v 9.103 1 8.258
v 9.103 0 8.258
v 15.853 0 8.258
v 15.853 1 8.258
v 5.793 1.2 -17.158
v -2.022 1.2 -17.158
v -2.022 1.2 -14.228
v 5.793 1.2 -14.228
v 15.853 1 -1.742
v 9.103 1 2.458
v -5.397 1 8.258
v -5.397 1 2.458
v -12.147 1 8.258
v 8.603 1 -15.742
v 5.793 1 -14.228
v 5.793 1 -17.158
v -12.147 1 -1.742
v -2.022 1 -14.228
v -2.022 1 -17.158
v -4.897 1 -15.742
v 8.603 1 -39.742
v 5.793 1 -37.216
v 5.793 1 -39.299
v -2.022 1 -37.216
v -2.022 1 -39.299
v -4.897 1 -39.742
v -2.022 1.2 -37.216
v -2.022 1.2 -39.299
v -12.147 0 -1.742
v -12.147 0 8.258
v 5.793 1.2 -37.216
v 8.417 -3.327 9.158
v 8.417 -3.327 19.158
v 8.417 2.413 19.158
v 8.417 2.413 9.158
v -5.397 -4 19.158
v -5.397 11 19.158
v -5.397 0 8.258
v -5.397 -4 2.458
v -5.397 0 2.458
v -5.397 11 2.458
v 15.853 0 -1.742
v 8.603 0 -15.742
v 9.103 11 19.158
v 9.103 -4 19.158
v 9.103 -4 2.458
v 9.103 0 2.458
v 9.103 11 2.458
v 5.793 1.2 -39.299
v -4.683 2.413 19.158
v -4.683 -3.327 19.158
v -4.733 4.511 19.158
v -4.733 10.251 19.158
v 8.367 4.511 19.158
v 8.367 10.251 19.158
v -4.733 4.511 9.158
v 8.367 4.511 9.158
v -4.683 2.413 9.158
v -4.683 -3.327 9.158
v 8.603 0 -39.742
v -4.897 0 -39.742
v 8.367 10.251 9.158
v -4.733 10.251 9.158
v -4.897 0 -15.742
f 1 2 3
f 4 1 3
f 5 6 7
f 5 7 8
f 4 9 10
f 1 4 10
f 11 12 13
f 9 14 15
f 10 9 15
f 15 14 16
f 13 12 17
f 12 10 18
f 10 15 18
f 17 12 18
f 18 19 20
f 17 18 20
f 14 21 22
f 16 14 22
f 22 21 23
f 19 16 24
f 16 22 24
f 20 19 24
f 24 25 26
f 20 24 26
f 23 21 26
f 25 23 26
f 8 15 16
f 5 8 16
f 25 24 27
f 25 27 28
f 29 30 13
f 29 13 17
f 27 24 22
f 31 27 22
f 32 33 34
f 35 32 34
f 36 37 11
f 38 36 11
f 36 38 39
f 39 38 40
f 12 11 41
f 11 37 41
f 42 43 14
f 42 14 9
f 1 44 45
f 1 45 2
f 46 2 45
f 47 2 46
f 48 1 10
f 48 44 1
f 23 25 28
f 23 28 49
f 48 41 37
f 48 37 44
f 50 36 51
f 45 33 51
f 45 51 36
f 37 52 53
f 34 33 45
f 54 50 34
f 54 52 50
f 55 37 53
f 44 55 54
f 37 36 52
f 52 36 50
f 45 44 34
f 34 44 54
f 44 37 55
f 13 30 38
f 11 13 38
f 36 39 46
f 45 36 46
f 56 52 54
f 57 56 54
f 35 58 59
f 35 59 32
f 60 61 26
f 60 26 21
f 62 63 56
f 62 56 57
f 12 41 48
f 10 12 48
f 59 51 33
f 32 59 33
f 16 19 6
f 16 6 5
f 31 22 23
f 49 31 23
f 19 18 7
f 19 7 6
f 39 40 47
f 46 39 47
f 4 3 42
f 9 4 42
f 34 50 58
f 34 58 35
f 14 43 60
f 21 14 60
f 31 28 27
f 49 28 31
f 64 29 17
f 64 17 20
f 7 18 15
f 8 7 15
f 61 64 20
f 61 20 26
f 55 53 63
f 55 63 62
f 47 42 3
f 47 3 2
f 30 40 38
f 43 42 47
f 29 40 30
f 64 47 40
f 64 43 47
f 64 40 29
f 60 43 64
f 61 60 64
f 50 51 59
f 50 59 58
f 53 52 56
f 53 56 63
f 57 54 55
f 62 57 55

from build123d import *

# Parameters (mm, degrees)
SKETCH1_W           = 28
SKETCH1_H           = 10
SKETCH1_W_2         = 13.5
SKETCH1_H_2         = 24
BOSS_EXTRUDE1_DEPTH = 1
SKETCH2_W           = 14.5
SKETCH2_H           = 16.7
BOSS_EXTRUDE2_DEPTH = 15
SKETCH3_W           = 13.1
SKETCH3_H           = 5.74
CUT_EXTRUDE1_DEPTH  = 10
SKETCH4_W           = 7.814614209
SKETCH4_H           = 2.930480328
SKETCH4_H_2         = 2.083897123
BOSS_EXTRUDE3_DEPTH = 0.2


with BuildPart() as part:
    # Sketch1 → Boss-Extrude1 (new body)
    with BuildSketch(Plane(origin=(0, 0, 0), x_dir=(1, 0, 0), z_dir=(0, 1, 0))):
        Polygon((-4.896995708, 15.74248927), (8.603004292, 15.74248927), (15.853004292, 1.74248927), (-12.146995708, 1.74248927), align=None)
        with Locations((1.853004292, -3.25751073)):
            Rectangle(SKETCH1_W, SKETCH1_H)
        with Locations((1.853004292, 27.74248927)):
            Rectangle(SKETCH1_W_2, SKETCH1_H_2)
    extrude(amount=BOSS_EXTRUDE1_DEPTH)

    # Sketch2 → Boss-Extrude2 (add)
    with BuildSketch(Plane(origin=(0, 11, 0), x_dir=(1, 0, 0), z_dir=(0, 1, 0))):
        with Locations((1.853004292, -10.80751073)):
            Rectangle(SKETCH2_W, SKETCH2_H)
    extrude(amount=-BOSS_EXTRUDE2_DEPTH)

    # Sketch3 → Cut-Extrude1 (cut)
    with BuildSketch(Plane.XY.offset(19.15751073)):
        with Locations((1.816567827, 7.380781329)):
            Rectangle(SKETCH3_W, SKETCH3_H)
        with Locations((1.867135477, -0.457204484)):
            Rectangle(SKETCH3_W, SKETCH3_H)
    extrude(amount=-CUT_EXTRUDE1_DEPTH, mode=Mode.SUBTRACT)

    # Sketch4 → Boss-Extrude3 (add)
    with BuildSketch(Plane(origin=(0, 1, 0), x_dir=(1, 0, 0), z_dir=(0, 1, 0))):
        with Locations((1.885565184, 15.692844408)):
            Rectangle(SKETCH4_W, SKETCH4_H)
        with Locations((1.885565184, 38.257542937)):
            Rectangle(SKETCH4_W, SKETCH4_H_2)
    extrude(amount=BOSS_EXTRUDE3_DEPTH)


solid = part.part
